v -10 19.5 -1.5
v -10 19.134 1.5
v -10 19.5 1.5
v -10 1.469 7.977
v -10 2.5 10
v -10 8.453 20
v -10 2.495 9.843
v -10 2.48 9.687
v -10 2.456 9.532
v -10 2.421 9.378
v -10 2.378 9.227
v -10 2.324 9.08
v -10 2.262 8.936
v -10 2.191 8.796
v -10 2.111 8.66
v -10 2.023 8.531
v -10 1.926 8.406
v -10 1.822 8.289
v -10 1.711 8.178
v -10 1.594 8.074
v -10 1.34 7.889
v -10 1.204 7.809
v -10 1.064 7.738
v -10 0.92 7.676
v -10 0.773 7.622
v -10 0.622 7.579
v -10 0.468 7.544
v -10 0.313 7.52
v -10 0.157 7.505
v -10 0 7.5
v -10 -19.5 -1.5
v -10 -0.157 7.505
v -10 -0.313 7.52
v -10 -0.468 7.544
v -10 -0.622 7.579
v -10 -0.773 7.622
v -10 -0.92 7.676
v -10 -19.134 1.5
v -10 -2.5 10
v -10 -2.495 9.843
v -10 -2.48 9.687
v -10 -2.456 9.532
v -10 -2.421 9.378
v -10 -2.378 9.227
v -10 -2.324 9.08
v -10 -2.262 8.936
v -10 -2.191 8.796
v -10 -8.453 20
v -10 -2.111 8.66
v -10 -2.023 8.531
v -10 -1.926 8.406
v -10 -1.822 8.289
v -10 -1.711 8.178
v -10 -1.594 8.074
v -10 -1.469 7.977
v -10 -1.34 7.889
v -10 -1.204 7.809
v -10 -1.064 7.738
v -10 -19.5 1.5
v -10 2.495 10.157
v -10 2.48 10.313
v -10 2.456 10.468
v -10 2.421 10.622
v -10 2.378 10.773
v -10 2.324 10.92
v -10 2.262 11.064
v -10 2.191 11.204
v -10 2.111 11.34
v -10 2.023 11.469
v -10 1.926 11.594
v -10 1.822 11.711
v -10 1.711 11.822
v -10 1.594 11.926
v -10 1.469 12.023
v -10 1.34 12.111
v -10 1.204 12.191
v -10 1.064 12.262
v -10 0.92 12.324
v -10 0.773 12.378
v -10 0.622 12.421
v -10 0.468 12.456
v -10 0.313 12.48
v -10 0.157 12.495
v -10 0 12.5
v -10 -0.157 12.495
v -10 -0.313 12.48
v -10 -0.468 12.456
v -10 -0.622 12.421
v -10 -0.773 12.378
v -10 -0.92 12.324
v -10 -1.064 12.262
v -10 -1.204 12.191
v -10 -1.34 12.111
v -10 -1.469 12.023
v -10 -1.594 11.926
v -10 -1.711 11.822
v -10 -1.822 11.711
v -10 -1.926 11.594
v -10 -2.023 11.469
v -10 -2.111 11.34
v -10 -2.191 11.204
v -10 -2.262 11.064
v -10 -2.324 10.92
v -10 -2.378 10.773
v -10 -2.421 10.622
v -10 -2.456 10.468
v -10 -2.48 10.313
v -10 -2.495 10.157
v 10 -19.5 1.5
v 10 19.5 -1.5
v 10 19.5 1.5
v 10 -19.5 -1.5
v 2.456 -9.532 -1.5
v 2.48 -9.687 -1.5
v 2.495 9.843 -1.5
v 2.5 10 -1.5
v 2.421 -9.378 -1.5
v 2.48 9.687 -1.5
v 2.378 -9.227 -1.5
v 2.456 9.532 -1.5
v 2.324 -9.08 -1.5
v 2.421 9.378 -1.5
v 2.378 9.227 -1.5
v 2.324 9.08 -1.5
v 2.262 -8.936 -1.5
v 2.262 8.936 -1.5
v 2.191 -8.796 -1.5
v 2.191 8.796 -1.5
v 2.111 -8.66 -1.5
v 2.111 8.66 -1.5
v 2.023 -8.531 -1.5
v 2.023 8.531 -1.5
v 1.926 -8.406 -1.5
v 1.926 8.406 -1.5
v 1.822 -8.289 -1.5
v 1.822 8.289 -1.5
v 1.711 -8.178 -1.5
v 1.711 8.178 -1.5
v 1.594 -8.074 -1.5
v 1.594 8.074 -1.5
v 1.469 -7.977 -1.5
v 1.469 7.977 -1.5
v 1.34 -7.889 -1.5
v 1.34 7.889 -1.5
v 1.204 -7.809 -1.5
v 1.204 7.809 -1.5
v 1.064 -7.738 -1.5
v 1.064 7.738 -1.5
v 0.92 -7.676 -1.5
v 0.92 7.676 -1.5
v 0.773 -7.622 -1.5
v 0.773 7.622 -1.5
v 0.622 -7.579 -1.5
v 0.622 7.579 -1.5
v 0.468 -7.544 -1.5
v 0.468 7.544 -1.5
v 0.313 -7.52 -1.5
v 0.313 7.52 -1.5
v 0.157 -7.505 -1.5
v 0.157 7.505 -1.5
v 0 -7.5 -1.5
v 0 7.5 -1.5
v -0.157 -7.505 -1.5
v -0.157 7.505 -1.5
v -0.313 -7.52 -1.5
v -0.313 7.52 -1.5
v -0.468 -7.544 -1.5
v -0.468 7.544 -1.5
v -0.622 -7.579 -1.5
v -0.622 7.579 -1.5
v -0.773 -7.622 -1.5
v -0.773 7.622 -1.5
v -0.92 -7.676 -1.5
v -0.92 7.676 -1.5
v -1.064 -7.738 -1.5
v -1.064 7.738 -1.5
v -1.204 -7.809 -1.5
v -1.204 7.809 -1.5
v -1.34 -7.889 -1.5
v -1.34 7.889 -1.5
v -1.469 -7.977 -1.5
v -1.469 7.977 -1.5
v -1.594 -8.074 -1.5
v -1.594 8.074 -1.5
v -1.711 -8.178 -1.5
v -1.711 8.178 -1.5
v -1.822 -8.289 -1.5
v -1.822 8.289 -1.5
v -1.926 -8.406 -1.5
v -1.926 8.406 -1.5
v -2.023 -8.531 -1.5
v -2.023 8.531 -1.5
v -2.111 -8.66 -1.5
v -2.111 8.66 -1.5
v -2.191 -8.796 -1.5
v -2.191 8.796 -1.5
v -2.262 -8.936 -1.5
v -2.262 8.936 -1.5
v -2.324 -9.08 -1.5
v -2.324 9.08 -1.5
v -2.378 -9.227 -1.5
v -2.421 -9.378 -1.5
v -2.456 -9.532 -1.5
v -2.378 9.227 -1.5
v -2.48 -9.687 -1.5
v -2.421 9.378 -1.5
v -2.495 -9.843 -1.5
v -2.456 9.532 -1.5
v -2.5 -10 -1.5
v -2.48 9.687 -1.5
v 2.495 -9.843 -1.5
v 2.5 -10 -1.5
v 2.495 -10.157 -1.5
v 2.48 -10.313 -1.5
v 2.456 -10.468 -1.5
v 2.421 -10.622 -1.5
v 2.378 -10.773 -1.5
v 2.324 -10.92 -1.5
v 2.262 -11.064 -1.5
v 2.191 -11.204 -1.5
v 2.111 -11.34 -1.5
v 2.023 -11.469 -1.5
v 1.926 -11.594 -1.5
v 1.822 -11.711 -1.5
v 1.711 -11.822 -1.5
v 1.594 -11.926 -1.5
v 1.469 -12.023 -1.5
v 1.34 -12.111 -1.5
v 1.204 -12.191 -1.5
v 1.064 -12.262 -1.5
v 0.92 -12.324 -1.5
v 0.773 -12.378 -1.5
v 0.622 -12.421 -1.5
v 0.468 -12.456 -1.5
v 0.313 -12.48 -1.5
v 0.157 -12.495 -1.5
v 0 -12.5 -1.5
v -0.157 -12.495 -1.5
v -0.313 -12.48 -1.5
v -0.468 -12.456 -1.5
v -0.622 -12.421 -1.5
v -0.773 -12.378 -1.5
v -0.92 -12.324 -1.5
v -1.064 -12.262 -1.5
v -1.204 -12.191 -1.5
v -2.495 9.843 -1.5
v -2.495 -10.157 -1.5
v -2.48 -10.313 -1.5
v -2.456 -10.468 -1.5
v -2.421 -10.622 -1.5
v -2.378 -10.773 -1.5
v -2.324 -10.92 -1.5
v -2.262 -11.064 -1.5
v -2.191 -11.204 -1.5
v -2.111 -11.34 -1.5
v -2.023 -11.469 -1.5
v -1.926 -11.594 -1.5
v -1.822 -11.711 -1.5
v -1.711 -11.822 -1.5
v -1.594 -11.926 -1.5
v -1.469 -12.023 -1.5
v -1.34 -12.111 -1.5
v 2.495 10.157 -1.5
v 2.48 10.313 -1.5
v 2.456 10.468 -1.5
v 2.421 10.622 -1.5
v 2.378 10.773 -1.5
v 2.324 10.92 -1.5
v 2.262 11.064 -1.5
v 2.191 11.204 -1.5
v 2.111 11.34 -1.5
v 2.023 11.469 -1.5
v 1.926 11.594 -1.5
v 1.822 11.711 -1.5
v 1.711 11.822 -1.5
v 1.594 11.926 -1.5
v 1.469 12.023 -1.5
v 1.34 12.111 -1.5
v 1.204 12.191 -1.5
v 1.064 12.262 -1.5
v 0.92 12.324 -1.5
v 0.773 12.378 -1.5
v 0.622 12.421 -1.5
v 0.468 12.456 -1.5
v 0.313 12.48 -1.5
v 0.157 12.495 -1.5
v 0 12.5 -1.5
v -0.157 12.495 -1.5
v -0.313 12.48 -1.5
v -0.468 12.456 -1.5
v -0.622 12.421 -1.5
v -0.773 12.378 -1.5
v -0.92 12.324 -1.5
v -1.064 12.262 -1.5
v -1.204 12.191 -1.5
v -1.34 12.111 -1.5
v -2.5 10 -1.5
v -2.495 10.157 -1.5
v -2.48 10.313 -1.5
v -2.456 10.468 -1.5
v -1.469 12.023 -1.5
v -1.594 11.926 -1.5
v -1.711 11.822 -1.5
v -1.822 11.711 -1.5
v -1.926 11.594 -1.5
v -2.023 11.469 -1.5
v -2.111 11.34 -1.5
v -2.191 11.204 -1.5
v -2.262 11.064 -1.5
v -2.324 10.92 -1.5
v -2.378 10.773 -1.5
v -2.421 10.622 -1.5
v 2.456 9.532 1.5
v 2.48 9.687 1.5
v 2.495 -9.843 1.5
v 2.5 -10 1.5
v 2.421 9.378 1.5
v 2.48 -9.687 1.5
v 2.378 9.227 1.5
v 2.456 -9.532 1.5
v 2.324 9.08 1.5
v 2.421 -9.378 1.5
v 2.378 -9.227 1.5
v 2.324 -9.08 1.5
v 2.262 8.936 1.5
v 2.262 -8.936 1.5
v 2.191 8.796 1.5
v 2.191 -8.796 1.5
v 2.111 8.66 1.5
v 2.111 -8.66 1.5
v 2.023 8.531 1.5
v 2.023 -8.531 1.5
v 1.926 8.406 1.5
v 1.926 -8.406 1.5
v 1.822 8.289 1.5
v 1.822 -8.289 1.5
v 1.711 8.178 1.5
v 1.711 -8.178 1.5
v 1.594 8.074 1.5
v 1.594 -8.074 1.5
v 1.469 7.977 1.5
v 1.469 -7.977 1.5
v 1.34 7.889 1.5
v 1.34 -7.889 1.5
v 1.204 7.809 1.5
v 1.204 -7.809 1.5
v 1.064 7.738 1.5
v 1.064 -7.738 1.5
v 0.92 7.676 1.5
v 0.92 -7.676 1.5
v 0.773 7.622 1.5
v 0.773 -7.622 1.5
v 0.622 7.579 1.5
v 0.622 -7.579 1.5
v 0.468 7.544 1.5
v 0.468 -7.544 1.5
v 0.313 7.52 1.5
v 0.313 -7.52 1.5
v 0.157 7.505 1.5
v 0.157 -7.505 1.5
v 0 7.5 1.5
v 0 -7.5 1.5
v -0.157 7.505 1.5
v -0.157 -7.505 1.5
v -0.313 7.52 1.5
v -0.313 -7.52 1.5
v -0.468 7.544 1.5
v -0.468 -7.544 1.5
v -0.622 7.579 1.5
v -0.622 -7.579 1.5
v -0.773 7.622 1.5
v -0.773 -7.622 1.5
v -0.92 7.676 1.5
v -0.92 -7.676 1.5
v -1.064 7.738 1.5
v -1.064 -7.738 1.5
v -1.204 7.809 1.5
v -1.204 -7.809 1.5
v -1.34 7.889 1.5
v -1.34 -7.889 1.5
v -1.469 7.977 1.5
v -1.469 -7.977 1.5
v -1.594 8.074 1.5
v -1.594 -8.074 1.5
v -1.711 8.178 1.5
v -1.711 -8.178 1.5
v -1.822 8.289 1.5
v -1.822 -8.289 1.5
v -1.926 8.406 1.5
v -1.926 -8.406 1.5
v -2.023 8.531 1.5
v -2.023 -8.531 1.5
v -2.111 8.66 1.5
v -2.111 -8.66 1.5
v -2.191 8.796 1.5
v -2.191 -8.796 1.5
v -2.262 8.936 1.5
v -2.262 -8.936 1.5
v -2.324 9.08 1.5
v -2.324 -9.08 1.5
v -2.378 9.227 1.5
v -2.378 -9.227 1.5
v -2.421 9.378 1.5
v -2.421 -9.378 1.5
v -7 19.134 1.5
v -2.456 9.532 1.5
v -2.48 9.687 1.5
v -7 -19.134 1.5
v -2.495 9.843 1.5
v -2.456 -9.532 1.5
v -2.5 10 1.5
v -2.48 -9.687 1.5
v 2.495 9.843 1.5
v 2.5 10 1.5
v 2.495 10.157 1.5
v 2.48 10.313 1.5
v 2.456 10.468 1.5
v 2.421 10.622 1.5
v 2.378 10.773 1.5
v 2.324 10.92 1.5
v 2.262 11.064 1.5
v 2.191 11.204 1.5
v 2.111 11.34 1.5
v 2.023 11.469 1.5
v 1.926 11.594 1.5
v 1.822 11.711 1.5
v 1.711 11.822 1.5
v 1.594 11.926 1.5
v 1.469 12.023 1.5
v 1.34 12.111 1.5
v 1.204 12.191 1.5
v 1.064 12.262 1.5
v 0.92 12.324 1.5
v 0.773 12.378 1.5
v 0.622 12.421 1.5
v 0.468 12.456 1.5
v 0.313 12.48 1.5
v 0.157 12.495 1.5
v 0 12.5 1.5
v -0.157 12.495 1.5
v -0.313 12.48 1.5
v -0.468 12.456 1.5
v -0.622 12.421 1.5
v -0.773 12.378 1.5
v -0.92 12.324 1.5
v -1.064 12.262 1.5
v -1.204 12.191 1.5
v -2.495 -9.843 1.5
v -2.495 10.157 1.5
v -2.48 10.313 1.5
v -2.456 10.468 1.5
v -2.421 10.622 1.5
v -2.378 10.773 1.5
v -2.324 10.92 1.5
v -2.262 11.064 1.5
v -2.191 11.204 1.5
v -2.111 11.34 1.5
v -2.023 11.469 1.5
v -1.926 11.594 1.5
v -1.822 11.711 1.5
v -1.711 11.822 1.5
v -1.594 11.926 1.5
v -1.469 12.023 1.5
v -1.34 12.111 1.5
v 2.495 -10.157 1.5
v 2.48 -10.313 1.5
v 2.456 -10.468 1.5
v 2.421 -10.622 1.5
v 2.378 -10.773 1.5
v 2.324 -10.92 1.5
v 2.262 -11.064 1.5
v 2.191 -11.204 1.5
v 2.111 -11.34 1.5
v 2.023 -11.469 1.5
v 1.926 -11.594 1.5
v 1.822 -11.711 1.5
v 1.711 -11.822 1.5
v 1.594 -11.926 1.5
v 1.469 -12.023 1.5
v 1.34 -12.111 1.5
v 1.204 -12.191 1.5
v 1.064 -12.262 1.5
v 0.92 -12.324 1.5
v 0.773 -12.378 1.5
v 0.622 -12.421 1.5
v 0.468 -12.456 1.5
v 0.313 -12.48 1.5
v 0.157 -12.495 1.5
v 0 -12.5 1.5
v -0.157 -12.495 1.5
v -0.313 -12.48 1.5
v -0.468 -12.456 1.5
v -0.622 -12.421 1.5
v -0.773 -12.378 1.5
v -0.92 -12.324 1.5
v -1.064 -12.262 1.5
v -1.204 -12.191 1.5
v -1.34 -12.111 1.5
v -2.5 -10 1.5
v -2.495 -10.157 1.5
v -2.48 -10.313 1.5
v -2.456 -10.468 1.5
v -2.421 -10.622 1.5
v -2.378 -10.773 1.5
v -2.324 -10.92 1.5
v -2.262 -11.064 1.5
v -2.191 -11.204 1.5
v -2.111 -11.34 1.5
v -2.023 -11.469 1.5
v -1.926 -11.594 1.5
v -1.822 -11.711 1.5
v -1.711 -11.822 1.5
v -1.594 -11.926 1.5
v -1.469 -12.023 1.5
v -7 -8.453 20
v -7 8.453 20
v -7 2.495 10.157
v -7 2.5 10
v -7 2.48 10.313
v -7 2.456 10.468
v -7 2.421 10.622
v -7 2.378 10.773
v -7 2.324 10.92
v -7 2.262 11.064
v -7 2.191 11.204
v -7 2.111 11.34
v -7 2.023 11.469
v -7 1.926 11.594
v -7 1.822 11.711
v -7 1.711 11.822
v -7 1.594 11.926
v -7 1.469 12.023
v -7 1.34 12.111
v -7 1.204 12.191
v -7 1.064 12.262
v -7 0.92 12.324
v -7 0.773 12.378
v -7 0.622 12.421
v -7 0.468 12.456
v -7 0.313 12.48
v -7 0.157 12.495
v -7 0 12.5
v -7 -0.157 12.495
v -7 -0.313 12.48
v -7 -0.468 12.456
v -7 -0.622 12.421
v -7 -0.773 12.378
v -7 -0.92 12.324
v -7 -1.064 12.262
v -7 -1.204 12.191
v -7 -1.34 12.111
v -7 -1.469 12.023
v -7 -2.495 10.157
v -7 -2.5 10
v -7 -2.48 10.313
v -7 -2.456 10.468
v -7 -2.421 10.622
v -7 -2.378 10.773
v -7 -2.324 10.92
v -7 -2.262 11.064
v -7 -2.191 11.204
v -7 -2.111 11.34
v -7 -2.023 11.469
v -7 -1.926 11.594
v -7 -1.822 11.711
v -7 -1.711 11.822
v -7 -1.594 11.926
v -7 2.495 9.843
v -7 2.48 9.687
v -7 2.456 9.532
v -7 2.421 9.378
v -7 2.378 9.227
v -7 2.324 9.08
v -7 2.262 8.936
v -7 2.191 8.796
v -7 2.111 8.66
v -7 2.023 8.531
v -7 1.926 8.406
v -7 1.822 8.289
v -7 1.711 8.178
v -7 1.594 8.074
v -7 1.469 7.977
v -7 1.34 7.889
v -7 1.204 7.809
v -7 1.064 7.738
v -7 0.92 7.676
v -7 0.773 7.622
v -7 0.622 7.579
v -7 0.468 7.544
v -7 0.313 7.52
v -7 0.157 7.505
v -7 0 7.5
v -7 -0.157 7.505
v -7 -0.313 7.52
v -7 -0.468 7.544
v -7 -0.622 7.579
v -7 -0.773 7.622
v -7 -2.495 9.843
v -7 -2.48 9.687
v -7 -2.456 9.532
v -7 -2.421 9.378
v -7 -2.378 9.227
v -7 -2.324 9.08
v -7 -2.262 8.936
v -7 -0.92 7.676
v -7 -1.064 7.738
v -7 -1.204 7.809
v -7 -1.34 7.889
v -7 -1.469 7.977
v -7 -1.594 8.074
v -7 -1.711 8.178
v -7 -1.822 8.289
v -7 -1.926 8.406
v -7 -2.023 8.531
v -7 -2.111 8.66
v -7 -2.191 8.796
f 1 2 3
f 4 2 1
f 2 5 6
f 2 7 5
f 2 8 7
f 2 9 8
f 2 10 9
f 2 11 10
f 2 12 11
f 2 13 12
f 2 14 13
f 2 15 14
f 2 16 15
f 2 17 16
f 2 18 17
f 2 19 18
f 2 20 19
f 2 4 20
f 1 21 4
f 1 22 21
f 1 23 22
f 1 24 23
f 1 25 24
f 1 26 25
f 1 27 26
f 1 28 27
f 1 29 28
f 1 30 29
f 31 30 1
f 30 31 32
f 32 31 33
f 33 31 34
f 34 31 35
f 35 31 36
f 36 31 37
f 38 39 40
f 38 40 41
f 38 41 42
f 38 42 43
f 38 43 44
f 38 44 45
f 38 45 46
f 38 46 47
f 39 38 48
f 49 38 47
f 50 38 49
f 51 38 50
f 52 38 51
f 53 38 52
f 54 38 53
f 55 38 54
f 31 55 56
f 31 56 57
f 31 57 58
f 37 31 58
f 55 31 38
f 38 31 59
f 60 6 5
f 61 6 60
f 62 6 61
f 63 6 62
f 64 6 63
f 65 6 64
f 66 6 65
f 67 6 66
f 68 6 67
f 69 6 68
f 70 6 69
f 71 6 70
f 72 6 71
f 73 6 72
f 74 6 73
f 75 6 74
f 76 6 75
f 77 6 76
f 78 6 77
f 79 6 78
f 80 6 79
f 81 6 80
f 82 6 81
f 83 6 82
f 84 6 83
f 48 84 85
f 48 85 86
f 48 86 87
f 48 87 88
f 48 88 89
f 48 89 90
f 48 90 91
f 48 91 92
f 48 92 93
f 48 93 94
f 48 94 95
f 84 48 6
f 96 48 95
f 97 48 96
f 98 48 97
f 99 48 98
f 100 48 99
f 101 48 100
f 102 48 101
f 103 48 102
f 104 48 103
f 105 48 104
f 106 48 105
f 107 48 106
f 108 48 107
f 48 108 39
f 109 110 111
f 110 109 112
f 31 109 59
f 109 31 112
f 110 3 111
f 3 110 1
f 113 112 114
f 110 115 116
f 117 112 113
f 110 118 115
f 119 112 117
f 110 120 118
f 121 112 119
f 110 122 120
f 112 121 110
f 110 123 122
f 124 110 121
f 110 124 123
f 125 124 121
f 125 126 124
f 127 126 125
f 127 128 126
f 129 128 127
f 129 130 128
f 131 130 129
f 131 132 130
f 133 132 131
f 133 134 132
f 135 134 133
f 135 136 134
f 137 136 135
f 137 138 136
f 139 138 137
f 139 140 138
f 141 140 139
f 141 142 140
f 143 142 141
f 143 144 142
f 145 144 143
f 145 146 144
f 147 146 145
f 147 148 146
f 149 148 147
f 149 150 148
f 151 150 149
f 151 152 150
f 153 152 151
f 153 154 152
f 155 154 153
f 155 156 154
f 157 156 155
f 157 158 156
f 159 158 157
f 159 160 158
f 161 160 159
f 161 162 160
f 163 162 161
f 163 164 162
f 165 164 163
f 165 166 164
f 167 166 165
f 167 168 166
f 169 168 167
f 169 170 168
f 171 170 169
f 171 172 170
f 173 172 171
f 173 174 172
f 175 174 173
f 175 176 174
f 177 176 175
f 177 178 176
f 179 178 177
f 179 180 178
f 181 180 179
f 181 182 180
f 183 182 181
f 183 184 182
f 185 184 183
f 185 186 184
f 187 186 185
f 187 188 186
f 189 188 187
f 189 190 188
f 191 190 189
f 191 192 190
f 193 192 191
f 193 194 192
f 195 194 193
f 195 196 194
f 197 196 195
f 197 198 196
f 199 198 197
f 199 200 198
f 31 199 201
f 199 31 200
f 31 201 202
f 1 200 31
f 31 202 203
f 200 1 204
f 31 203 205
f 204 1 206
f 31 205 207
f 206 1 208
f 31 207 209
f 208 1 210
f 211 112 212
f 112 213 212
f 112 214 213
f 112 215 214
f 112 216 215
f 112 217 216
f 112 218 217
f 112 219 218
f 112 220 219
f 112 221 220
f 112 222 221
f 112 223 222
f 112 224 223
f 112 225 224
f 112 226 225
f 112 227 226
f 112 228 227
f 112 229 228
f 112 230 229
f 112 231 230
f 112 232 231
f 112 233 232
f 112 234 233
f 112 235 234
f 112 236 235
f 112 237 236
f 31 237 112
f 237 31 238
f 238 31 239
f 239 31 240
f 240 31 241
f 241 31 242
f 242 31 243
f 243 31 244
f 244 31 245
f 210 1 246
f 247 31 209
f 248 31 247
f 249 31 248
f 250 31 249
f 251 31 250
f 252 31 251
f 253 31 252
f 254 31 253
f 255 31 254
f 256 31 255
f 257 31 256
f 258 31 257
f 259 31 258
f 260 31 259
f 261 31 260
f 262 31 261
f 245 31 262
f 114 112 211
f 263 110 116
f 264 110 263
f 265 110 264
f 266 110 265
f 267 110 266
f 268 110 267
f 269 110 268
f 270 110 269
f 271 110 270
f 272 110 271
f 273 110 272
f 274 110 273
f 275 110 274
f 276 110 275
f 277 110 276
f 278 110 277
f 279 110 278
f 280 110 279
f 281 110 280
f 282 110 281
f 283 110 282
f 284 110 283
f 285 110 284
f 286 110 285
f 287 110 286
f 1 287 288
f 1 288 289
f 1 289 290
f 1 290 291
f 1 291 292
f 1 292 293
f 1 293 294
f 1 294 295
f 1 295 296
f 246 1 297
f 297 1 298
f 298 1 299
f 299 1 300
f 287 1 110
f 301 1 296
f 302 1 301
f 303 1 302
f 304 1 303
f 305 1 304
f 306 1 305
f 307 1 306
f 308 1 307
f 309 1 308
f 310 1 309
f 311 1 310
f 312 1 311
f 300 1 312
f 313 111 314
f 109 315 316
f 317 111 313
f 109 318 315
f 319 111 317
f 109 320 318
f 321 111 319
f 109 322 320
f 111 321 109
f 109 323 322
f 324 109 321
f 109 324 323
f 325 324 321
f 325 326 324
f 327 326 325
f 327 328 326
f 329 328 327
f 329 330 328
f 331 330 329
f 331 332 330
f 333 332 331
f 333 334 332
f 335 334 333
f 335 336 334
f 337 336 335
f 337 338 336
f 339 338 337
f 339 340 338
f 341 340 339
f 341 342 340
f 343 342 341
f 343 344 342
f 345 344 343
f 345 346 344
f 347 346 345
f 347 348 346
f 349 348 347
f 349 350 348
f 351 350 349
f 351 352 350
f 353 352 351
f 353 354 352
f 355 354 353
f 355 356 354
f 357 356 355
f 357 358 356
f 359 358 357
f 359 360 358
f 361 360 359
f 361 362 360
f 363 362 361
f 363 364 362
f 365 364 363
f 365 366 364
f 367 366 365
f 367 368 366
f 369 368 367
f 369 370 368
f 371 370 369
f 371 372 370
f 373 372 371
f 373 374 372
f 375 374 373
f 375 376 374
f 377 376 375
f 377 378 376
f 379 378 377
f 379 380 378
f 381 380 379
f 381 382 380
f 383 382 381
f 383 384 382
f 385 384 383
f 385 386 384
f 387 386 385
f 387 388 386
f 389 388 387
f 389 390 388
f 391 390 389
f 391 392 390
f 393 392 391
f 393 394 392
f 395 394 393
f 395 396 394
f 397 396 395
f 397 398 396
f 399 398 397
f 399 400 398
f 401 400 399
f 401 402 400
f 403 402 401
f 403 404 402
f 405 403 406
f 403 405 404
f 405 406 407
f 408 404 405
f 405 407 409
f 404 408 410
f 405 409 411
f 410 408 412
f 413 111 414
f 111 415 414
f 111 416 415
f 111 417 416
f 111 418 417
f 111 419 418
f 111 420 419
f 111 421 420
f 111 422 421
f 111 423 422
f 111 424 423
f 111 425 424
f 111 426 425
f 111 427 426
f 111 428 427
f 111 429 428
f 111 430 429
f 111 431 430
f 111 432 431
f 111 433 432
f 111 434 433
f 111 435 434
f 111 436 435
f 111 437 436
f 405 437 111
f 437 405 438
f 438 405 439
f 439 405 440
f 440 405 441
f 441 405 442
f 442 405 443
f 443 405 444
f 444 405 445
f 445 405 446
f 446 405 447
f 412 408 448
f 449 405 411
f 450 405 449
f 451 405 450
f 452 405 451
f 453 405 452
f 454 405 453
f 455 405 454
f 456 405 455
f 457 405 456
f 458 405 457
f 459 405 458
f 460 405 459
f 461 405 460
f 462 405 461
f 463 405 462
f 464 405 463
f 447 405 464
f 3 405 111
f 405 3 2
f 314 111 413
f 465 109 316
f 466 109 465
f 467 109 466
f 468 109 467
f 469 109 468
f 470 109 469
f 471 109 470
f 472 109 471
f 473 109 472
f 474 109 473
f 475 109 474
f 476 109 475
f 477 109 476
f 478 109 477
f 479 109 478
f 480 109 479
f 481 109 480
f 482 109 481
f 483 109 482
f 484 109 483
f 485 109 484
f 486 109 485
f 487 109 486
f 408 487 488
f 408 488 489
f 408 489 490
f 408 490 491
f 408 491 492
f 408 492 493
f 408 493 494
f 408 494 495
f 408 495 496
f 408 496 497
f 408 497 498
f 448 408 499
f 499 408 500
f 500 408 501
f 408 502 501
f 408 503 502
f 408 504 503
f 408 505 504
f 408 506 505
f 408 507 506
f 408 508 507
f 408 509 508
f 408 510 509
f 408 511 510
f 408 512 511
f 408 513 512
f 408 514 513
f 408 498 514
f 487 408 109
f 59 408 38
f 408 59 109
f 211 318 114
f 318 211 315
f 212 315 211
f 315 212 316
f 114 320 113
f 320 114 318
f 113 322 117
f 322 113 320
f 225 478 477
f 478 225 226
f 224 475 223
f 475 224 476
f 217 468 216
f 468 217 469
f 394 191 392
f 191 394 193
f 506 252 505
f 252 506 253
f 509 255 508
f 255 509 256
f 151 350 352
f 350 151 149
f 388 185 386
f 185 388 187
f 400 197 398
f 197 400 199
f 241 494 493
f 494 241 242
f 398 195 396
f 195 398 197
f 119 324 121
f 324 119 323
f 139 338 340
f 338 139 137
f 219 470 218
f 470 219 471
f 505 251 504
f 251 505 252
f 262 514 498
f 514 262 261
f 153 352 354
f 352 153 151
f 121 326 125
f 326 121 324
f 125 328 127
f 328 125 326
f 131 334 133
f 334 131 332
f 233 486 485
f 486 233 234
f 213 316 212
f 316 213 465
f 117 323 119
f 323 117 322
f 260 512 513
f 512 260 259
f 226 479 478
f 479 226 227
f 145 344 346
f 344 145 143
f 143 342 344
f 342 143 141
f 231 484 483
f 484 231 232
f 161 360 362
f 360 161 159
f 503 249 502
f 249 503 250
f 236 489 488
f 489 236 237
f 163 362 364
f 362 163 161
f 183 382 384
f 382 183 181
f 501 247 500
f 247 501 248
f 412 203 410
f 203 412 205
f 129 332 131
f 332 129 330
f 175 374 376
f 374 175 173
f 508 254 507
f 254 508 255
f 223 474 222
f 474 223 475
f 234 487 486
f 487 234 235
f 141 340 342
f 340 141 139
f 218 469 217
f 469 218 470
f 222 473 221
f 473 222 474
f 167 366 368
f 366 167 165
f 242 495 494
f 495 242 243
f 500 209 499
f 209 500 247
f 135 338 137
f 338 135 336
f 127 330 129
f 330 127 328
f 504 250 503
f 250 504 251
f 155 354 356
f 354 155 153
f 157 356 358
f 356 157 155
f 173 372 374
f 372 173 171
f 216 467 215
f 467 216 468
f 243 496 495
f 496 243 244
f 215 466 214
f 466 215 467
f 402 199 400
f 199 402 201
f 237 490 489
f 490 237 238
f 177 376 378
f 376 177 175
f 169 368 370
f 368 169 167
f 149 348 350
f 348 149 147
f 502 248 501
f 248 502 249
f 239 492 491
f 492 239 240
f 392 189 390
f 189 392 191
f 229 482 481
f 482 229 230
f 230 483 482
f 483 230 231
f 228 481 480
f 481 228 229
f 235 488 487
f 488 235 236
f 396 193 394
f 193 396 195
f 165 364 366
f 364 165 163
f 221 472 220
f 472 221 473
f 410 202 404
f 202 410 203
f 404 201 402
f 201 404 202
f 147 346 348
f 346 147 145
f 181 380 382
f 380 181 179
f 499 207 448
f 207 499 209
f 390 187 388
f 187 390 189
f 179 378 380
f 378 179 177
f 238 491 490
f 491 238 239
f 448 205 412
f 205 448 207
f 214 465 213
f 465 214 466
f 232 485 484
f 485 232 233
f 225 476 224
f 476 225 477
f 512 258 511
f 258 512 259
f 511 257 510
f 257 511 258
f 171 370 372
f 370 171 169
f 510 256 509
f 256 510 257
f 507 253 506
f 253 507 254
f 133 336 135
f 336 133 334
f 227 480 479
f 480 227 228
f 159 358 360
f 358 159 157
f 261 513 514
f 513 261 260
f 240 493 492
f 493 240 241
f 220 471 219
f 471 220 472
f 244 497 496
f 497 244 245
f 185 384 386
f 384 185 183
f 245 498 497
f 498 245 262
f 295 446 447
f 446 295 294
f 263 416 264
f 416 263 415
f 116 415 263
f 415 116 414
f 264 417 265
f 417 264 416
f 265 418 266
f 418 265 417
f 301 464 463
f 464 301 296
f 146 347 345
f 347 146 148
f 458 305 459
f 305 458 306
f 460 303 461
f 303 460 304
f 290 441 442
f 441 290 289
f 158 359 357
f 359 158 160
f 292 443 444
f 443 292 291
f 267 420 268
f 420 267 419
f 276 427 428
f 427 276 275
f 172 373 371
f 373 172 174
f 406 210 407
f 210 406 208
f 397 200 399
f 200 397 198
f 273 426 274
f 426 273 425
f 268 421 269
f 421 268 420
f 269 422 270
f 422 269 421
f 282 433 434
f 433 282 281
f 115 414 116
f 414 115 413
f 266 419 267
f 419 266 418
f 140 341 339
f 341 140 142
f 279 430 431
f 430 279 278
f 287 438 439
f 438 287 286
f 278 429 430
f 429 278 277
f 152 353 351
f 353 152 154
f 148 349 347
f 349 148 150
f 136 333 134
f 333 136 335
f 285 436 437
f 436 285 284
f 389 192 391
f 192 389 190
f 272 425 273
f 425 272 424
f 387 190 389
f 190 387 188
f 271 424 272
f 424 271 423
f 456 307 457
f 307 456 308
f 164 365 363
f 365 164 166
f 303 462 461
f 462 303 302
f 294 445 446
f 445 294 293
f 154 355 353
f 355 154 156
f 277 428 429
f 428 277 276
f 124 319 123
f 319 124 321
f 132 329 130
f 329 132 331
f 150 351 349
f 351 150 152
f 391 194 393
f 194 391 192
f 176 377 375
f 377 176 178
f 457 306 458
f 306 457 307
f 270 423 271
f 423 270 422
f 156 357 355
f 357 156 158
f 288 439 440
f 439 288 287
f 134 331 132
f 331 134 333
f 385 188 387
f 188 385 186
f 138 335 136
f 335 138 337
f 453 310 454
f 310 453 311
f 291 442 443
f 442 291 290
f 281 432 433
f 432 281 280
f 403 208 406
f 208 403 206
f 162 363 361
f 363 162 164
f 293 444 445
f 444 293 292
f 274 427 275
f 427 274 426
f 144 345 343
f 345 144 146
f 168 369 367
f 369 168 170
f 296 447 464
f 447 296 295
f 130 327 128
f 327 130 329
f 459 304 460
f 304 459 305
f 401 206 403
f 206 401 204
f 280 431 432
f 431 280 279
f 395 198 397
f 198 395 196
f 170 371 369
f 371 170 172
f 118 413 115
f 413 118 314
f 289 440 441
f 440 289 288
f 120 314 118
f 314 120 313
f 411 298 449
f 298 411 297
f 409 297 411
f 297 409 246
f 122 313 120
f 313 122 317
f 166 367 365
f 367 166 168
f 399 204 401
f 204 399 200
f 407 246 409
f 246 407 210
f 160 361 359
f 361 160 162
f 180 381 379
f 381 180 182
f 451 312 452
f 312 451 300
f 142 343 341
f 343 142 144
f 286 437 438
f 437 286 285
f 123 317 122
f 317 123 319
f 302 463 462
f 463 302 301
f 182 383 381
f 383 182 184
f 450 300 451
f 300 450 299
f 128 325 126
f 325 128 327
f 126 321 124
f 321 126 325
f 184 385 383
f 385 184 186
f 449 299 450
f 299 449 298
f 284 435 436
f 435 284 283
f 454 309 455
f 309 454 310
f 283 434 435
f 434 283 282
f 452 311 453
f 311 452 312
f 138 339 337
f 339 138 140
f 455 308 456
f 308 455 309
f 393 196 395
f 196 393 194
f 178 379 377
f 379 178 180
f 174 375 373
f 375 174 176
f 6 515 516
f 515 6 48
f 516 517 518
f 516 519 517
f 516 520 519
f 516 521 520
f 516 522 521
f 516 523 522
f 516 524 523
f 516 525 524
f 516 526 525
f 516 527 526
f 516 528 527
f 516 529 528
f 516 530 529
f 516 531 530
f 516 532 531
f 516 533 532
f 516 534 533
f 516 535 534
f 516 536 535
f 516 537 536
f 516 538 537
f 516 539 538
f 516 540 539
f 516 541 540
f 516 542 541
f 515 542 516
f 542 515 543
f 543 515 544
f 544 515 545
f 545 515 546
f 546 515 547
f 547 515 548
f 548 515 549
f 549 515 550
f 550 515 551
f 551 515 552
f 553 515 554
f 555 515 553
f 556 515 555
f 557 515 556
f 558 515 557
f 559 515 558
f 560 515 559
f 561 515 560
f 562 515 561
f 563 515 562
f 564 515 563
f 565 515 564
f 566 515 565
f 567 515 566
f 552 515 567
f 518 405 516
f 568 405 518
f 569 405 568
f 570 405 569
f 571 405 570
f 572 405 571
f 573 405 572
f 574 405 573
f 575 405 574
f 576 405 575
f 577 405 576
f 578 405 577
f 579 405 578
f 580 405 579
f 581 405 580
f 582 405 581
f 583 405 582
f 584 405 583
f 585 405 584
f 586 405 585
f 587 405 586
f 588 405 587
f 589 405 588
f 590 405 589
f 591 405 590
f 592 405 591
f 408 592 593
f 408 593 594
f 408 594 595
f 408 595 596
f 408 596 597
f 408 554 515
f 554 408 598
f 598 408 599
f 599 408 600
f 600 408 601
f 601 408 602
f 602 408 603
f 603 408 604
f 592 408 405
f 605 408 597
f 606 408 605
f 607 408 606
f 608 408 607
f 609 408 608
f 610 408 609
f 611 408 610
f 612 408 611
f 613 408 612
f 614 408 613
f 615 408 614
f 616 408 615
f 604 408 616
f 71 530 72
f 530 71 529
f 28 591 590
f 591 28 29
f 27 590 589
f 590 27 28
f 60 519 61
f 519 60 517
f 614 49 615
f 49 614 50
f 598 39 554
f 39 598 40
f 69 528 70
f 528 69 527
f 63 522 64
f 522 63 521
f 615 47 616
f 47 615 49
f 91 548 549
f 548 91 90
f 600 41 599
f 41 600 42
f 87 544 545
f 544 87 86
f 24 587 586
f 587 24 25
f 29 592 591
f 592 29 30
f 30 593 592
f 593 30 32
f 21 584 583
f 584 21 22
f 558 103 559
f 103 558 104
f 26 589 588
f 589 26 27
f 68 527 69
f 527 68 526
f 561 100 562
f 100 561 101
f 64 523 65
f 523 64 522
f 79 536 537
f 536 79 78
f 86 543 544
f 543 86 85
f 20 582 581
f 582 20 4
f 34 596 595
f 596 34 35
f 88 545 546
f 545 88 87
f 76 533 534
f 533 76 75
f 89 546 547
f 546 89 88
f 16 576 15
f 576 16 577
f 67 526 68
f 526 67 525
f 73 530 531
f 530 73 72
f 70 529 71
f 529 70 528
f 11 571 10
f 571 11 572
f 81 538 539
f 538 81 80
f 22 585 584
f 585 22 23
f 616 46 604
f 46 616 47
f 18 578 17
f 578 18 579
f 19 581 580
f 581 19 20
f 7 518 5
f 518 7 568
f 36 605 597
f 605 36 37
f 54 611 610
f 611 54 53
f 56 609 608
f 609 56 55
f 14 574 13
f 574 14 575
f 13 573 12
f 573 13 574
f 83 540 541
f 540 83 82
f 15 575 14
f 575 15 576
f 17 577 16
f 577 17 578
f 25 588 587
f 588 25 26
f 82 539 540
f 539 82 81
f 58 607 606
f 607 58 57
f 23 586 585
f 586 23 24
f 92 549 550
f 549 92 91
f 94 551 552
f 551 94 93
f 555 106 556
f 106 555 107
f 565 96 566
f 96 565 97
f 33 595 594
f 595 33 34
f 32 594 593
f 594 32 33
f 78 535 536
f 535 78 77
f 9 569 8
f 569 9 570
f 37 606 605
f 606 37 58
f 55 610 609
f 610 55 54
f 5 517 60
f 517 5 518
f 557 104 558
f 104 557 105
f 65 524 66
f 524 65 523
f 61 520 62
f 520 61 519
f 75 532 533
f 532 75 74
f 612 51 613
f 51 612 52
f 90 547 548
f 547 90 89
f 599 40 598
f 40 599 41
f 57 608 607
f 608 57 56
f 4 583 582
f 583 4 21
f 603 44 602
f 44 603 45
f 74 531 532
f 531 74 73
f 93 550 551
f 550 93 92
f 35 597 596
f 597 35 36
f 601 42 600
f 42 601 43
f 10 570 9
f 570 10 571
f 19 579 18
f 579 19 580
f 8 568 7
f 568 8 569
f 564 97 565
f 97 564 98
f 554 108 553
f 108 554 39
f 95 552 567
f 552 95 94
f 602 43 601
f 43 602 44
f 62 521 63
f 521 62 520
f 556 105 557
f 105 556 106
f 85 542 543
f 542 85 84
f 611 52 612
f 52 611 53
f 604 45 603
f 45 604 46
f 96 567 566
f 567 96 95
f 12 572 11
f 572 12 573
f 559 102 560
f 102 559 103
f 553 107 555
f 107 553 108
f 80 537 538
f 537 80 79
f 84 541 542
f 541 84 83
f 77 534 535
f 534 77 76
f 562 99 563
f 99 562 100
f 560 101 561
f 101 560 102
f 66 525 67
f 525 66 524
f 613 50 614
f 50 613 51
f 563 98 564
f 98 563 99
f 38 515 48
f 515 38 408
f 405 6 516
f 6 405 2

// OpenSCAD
h = 100;
d= 5;
fn = 100;


soporteRueda();

module soporteRueda(){
  union(){
    rectangulo();
    soporteLateral();  
  }
}

module rectangulo(){
    
    difference(){

      rotate([90,0,0])
          cube ([20,3,39], center = true);
    
     translate([0,-10,0])
         cylinder (h = h, d = d, center = true, $fn = fn);
     
      // Agujero base derecha
      translate([0,10,0])
         cylinder (h = h, d = d, center = true, $fn = fn); 
    }
    
}

module soporteLateral(){
    
    difference(){
      // Soporte Central
      rotate([0,0,90])
        translate([0,8.5,10])
          cube ([39,3,20], center = true);

      // Agujero central
      translate([10,0,10])
        rotate([0,90,0])
          cylinder (h = h, d = d, center = true, $fn = fn);
   
      //Cortar izquierda   
      translate([-5.5,-20,10])
        rotate([60,0,0])
          rotate([90,0,0])
            cube([10,10,35], center = true);
        
      // Corte derecha
      translate([-5.5,20,10])
        rotate([30,0,0])
          cube([10,10,35], center = true);

    }
    
}
